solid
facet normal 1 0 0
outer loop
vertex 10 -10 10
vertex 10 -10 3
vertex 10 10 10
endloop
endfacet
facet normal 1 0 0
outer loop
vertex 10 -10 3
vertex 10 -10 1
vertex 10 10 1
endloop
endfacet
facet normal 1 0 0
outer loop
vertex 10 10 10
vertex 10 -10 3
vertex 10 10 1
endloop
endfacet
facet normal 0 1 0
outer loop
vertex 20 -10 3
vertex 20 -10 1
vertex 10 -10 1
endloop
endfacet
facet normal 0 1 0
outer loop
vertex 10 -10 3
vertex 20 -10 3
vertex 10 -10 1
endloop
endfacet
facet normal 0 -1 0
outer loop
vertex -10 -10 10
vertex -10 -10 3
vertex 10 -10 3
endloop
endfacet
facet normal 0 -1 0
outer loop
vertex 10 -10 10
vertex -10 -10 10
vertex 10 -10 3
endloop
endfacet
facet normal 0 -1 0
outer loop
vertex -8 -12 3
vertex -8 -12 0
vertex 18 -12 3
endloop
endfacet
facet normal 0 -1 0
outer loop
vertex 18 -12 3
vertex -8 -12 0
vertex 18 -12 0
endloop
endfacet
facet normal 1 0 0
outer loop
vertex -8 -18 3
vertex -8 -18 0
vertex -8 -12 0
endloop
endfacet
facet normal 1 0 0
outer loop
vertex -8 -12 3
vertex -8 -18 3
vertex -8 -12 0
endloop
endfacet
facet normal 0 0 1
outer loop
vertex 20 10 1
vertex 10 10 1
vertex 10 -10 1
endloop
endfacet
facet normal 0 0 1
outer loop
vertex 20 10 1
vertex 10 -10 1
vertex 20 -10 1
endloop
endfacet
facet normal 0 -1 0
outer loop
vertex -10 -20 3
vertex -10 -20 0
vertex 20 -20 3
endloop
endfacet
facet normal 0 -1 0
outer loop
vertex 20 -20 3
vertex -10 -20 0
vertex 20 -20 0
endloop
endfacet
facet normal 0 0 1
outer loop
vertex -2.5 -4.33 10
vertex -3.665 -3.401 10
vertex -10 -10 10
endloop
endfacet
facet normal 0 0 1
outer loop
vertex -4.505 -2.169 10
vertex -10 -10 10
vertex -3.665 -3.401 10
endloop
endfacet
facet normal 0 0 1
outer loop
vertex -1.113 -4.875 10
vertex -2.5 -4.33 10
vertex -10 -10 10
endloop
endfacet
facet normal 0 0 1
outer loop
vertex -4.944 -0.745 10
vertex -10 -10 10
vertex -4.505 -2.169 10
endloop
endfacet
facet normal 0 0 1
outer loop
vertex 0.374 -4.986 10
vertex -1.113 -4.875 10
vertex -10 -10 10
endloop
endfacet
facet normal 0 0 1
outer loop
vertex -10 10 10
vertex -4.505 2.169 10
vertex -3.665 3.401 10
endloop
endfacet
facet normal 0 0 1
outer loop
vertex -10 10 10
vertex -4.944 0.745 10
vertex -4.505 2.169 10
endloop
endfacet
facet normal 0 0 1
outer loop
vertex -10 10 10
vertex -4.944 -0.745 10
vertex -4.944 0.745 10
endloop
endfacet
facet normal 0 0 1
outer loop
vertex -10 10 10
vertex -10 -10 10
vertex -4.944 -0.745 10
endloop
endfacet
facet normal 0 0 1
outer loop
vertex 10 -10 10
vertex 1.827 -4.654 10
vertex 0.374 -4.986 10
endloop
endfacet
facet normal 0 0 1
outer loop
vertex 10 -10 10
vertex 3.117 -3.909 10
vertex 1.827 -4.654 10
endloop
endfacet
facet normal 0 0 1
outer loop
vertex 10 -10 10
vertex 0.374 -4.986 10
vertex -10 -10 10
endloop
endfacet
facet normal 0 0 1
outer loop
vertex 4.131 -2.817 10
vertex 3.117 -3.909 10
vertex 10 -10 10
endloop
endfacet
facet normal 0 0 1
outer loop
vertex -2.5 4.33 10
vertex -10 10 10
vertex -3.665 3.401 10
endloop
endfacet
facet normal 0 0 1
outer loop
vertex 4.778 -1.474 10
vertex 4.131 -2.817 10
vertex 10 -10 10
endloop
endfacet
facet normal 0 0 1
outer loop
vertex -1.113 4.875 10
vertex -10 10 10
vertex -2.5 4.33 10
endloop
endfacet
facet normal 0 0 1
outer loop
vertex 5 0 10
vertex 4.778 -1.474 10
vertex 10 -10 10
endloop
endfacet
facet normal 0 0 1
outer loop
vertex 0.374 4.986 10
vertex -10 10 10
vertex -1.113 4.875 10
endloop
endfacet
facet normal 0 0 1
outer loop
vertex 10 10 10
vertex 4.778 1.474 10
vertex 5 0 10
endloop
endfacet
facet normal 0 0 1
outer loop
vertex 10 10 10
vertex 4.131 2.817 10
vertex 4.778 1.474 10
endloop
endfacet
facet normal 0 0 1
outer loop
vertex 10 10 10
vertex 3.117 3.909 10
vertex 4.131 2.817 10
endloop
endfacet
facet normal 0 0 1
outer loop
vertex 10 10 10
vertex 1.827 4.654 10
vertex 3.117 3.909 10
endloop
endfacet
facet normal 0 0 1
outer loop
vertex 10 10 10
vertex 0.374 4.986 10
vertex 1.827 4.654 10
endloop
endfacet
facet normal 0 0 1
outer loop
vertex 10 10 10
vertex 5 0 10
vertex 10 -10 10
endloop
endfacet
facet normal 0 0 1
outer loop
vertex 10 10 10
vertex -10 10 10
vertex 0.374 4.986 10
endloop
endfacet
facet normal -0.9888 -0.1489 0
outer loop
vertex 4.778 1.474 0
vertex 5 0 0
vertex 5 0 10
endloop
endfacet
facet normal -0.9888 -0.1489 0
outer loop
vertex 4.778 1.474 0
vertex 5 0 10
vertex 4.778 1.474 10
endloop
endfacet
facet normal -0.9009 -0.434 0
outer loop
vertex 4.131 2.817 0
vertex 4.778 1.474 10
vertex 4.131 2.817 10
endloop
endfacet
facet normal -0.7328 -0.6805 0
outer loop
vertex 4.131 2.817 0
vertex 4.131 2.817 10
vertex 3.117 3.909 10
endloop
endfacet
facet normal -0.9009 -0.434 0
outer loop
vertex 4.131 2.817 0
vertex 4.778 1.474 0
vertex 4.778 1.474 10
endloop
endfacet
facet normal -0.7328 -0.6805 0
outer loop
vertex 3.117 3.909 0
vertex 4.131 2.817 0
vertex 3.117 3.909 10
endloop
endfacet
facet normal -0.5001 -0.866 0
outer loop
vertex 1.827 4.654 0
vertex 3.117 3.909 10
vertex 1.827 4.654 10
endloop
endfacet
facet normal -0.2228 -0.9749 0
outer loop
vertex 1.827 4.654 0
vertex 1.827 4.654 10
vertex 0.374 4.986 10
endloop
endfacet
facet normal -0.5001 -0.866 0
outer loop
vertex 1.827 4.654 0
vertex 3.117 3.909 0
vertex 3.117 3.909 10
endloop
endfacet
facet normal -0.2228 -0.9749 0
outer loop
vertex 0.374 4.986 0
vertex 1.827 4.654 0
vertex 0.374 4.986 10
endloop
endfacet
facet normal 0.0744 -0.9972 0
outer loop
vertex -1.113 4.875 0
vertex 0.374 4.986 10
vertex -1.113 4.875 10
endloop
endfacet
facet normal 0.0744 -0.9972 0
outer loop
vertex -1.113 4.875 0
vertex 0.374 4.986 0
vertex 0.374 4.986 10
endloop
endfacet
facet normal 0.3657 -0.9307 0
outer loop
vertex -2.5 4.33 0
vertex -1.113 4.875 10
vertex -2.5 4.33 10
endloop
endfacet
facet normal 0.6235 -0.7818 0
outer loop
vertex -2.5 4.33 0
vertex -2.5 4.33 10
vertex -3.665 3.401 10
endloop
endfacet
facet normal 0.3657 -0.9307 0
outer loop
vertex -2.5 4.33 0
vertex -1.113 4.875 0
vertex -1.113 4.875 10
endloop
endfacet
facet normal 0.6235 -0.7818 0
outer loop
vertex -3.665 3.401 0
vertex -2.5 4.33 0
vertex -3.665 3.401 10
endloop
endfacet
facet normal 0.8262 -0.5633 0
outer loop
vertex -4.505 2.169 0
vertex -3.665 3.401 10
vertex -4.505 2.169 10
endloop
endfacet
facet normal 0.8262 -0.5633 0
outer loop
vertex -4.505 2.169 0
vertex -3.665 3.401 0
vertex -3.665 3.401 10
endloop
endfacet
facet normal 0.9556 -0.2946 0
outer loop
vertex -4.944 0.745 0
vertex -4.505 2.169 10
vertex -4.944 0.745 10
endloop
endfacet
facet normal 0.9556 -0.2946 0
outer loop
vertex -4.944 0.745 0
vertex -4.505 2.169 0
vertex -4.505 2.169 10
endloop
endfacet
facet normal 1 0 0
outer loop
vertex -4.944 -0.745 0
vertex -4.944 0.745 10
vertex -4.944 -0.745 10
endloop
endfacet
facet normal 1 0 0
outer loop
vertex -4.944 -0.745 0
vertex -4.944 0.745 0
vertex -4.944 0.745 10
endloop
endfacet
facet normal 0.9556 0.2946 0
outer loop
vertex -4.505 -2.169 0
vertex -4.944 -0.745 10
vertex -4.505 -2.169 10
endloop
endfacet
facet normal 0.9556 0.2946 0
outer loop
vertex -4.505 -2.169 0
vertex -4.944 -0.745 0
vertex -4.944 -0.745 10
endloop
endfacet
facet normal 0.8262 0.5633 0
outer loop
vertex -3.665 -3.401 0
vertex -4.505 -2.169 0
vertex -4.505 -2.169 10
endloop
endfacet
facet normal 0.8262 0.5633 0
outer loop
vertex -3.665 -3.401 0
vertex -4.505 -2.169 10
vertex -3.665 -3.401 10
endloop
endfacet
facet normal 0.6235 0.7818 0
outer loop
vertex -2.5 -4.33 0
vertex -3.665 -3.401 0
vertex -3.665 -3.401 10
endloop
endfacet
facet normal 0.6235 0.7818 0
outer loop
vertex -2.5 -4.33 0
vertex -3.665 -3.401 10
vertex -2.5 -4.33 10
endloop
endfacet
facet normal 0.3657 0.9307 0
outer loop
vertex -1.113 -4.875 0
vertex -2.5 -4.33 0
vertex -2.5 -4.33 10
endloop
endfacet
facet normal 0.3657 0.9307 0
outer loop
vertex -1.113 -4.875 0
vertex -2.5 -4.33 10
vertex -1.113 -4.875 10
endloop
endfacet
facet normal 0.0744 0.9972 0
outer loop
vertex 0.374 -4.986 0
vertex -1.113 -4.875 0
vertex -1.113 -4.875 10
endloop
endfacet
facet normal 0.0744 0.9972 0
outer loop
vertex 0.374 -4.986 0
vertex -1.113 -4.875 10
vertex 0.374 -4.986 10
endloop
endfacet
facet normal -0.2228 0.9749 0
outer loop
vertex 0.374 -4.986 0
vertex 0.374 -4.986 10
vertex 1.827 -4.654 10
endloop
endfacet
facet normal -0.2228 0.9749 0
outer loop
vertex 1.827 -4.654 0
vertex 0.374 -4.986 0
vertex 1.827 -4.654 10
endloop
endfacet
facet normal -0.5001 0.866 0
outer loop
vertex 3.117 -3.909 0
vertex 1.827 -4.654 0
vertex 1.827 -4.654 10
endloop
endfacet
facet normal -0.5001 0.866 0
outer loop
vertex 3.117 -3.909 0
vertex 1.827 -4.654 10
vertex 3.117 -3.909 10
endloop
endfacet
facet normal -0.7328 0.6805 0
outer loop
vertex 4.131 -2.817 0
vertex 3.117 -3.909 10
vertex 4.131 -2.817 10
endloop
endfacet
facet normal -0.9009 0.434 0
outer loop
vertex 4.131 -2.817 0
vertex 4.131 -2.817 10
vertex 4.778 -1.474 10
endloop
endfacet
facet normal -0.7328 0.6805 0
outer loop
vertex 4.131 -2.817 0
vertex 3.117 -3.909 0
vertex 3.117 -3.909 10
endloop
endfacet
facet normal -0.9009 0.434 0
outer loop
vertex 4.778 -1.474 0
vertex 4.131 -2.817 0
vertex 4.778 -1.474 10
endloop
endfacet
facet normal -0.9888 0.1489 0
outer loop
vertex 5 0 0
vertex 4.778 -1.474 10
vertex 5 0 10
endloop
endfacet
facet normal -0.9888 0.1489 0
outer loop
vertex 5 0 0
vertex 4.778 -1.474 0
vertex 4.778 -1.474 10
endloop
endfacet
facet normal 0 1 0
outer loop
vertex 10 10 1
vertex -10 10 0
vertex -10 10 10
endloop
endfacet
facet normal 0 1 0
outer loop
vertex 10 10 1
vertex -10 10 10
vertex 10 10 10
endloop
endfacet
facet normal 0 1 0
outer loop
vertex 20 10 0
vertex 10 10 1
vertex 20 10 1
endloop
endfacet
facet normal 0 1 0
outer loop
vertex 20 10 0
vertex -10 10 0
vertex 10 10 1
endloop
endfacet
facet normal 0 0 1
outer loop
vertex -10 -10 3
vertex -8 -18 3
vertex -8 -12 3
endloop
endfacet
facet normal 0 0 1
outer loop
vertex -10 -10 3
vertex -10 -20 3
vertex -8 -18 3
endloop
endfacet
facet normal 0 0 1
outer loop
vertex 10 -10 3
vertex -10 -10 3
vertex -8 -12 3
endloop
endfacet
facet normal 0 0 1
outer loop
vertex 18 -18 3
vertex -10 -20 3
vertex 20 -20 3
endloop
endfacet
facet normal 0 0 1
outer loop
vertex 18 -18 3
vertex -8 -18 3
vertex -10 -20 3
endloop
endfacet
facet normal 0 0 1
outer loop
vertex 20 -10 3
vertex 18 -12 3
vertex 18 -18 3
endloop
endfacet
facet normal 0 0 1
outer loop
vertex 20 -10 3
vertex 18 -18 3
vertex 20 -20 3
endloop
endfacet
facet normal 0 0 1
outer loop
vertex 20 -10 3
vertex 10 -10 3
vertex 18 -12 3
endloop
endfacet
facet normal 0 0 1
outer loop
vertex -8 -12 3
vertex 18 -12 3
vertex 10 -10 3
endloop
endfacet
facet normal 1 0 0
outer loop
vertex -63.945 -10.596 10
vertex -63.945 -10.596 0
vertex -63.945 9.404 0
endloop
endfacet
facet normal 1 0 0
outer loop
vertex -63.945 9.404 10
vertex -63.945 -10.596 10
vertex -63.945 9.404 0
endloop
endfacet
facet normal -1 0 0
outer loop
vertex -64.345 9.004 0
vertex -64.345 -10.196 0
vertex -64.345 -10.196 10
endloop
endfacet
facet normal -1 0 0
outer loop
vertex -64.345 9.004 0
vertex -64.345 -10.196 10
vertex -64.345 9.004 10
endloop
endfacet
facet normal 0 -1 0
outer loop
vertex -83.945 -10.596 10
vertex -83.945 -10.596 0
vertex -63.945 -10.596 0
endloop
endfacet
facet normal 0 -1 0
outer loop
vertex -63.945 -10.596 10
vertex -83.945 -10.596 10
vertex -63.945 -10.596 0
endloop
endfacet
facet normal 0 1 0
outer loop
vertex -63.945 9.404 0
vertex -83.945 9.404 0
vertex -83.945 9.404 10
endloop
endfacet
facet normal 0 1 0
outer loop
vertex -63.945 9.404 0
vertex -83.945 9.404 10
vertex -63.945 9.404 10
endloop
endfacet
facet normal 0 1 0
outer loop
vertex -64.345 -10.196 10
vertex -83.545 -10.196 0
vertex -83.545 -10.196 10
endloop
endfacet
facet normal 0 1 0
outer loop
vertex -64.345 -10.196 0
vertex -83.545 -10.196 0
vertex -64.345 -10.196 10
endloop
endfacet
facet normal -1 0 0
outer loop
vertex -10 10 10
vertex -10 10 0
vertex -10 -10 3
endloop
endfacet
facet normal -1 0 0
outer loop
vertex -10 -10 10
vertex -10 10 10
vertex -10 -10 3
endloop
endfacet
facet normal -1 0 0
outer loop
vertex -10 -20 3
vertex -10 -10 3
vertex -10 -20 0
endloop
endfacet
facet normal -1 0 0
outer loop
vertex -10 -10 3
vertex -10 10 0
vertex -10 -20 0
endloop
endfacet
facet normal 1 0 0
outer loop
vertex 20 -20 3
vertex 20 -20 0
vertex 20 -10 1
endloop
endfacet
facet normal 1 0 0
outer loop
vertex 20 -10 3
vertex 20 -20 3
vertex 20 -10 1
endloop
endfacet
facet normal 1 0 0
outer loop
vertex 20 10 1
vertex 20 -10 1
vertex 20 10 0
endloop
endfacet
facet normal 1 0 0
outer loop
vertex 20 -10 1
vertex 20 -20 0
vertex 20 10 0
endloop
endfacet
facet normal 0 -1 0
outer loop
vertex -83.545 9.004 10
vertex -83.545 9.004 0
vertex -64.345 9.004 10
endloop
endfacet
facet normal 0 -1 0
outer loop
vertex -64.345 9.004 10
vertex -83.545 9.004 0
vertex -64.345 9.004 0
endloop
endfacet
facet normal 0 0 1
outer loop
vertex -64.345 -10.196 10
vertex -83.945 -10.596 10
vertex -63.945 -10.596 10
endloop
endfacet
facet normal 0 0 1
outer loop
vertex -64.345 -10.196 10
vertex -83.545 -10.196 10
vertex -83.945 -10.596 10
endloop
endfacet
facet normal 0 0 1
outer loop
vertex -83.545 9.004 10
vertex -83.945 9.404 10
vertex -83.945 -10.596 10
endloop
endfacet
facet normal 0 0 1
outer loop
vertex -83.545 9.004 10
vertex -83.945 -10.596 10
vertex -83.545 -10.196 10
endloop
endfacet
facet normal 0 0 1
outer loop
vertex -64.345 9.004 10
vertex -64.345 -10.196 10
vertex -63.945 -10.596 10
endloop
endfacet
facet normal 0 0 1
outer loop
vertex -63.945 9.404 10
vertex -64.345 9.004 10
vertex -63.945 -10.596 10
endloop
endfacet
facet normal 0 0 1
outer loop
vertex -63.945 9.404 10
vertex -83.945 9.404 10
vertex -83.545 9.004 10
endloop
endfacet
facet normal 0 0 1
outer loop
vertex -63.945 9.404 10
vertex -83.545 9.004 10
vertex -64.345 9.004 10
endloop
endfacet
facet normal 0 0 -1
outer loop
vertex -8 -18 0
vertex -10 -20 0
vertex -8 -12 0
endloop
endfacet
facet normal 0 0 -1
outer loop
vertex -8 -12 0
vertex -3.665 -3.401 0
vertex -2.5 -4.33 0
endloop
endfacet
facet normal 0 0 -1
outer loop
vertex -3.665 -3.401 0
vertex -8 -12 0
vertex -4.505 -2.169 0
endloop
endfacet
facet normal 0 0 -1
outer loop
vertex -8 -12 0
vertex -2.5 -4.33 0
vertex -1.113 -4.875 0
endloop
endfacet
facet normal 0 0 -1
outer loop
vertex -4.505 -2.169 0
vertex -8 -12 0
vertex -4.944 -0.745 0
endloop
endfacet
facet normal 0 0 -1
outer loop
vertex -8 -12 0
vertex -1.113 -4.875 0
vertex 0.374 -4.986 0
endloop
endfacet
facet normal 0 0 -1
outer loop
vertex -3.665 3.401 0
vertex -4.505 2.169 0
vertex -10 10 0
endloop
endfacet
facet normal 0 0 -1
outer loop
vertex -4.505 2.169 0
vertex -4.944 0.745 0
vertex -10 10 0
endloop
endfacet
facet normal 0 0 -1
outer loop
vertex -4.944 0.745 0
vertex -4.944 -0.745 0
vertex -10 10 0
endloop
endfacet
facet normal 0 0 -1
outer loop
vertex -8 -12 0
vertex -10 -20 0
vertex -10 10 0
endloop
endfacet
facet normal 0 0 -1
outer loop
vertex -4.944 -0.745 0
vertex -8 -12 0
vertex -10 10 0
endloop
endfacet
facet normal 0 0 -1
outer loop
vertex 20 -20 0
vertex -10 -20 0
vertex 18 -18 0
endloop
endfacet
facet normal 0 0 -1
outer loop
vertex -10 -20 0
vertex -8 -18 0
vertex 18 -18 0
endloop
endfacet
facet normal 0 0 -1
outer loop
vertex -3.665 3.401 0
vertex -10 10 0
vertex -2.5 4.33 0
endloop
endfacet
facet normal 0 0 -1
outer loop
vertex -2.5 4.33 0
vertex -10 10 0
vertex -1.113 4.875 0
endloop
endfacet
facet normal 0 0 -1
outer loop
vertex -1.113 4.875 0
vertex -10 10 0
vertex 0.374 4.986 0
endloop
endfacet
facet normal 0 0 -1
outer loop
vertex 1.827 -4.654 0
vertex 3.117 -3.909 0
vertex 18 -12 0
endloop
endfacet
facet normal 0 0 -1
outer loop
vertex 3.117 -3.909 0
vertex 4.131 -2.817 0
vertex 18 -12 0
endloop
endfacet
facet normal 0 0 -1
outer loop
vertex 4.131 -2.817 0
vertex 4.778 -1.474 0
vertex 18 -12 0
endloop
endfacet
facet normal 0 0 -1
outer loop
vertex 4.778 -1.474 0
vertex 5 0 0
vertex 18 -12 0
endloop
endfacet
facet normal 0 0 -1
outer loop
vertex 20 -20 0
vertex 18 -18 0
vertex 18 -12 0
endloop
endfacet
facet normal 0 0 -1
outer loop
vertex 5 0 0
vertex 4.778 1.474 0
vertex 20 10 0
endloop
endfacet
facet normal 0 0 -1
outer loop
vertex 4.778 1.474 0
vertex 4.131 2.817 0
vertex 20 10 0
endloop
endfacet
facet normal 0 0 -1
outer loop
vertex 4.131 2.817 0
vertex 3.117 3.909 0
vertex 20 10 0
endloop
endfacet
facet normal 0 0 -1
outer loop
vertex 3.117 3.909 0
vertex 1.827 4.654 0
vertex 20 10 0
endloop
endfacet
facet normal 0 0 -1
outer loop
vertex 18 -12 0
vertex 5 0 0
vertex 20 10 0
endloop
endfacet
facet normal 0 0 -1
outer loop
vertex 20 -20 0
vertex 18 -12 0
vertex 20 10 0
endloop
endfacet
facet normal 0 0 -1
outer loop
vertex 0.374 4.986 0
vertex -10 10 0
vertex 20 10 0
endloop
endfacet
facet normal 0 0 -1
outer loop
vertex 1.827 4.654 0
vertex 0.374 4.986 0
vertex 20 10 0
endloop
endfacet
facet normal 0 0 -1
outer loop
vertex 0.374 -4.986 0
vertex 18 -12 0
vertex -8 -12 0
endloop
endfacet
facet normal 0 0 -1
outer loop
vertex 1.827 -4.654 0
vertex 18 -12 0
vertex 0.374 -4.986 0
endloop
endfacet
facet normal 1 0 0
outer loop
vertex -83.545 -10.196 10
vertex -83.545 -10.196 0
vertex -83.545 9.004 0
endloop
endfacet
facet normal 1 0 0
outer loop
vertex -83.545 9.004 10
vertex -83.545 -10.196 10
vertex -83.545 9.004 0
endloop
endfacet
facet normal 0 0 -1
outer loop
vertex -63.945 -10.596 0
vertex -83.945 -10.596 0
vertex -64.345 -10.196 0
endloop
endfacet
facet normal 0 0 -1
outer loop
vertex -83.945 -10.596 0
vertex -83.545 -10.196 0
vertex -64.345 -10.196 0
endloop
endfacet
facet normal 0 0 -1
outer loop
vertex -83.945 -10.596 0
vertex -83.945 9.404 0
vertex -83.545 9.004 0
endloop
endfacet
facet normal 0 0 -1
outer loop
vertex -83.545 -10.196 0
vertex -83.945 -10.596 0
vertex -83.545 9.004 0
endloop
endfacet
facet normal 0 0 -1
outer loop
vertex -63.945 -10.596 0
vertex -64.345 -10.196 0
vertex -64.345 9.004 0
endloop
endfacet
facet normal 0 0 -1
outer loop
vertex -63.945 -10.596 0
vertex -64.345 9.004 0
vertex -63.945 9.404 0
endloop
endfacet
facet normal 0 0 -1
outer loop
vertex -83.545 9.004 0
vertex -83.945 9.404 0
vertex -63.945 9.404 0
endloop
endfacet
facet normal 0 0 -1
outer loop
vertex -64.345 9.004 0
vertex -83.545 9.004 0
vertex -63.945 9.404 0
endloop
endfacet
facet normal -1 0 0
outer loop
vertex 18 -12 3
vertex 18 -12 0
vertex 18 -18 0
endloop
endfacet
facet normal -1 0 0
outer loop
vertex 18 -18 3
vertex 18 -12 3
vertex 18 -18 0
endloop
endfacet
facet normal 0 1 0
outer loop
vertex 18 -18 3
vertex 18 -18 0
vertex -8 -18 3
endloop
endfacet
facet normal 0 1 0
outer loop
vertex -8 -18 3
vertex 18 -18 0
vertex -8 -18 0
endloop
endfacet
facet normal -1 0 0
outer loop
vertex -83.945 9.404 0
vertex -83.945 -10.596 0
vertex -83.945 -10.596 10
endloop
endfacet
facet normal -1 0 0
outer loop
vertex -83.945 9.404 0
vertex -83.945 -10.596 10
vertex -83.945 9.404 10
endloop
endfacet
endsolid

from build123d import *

# Parameters (mm, degrees)
F0_W     = 20
F0_H     = 20
F0_R     = 5
F1_DEPTH = 10
F0_W_2   = 10
F2_DEPTH = 1
F3_DEPTH = 3
F0_W_3   = 19.2
F0_H_2   = 19.2
F4_DEPTH = 10


with BuildPart() as f1:
    # F0 (on Top) → F1 (new body)
    with BuildSketch(Plane.XY):
        Rectangle(F0_W, F0_H)
        Circle(F0_R, mode=Mode.SUBTRACT)
    extrude(amount=F1_DEPTH)

    # F0 (on Top) → F2 (join)
    with BuildSketch(Plane.XY):
        with Locations((15, 0)):
            Rectangle(F0_W_2, F0_H)
    extrude(amount=F2_DEPTH)

    # F0 (on Top) → F3 (join)
    with BuildSketch(Plane.XY):
        Polygon((20, -10), (10, -10), (-10, -10), (-10, -20), (20, -20), align=None)
        Polygon((18, -18), (-8, -18), (-8, -12), (10, -12), (18, -12), align=None, mode=Mode.SUBTRACT)
    extrude(amount=F3_DEPTH)


with BuildPart() as f4:
    # F0 (on Top) → F4 (new body)
    with BuildSketch(Plane.XY):
        with Locations((-73.945356, -0.595633)):
            Rectangle(F0_W, F0_H)
        with Locations((-73.945356, -0.595633)):
            Rectangle(F0_W_3, F0_H_2, mode=Mode.SUBTRACT)
    extrude(amount=F4_DEPTH)


solid = Compound([f1.part, f4.part])
